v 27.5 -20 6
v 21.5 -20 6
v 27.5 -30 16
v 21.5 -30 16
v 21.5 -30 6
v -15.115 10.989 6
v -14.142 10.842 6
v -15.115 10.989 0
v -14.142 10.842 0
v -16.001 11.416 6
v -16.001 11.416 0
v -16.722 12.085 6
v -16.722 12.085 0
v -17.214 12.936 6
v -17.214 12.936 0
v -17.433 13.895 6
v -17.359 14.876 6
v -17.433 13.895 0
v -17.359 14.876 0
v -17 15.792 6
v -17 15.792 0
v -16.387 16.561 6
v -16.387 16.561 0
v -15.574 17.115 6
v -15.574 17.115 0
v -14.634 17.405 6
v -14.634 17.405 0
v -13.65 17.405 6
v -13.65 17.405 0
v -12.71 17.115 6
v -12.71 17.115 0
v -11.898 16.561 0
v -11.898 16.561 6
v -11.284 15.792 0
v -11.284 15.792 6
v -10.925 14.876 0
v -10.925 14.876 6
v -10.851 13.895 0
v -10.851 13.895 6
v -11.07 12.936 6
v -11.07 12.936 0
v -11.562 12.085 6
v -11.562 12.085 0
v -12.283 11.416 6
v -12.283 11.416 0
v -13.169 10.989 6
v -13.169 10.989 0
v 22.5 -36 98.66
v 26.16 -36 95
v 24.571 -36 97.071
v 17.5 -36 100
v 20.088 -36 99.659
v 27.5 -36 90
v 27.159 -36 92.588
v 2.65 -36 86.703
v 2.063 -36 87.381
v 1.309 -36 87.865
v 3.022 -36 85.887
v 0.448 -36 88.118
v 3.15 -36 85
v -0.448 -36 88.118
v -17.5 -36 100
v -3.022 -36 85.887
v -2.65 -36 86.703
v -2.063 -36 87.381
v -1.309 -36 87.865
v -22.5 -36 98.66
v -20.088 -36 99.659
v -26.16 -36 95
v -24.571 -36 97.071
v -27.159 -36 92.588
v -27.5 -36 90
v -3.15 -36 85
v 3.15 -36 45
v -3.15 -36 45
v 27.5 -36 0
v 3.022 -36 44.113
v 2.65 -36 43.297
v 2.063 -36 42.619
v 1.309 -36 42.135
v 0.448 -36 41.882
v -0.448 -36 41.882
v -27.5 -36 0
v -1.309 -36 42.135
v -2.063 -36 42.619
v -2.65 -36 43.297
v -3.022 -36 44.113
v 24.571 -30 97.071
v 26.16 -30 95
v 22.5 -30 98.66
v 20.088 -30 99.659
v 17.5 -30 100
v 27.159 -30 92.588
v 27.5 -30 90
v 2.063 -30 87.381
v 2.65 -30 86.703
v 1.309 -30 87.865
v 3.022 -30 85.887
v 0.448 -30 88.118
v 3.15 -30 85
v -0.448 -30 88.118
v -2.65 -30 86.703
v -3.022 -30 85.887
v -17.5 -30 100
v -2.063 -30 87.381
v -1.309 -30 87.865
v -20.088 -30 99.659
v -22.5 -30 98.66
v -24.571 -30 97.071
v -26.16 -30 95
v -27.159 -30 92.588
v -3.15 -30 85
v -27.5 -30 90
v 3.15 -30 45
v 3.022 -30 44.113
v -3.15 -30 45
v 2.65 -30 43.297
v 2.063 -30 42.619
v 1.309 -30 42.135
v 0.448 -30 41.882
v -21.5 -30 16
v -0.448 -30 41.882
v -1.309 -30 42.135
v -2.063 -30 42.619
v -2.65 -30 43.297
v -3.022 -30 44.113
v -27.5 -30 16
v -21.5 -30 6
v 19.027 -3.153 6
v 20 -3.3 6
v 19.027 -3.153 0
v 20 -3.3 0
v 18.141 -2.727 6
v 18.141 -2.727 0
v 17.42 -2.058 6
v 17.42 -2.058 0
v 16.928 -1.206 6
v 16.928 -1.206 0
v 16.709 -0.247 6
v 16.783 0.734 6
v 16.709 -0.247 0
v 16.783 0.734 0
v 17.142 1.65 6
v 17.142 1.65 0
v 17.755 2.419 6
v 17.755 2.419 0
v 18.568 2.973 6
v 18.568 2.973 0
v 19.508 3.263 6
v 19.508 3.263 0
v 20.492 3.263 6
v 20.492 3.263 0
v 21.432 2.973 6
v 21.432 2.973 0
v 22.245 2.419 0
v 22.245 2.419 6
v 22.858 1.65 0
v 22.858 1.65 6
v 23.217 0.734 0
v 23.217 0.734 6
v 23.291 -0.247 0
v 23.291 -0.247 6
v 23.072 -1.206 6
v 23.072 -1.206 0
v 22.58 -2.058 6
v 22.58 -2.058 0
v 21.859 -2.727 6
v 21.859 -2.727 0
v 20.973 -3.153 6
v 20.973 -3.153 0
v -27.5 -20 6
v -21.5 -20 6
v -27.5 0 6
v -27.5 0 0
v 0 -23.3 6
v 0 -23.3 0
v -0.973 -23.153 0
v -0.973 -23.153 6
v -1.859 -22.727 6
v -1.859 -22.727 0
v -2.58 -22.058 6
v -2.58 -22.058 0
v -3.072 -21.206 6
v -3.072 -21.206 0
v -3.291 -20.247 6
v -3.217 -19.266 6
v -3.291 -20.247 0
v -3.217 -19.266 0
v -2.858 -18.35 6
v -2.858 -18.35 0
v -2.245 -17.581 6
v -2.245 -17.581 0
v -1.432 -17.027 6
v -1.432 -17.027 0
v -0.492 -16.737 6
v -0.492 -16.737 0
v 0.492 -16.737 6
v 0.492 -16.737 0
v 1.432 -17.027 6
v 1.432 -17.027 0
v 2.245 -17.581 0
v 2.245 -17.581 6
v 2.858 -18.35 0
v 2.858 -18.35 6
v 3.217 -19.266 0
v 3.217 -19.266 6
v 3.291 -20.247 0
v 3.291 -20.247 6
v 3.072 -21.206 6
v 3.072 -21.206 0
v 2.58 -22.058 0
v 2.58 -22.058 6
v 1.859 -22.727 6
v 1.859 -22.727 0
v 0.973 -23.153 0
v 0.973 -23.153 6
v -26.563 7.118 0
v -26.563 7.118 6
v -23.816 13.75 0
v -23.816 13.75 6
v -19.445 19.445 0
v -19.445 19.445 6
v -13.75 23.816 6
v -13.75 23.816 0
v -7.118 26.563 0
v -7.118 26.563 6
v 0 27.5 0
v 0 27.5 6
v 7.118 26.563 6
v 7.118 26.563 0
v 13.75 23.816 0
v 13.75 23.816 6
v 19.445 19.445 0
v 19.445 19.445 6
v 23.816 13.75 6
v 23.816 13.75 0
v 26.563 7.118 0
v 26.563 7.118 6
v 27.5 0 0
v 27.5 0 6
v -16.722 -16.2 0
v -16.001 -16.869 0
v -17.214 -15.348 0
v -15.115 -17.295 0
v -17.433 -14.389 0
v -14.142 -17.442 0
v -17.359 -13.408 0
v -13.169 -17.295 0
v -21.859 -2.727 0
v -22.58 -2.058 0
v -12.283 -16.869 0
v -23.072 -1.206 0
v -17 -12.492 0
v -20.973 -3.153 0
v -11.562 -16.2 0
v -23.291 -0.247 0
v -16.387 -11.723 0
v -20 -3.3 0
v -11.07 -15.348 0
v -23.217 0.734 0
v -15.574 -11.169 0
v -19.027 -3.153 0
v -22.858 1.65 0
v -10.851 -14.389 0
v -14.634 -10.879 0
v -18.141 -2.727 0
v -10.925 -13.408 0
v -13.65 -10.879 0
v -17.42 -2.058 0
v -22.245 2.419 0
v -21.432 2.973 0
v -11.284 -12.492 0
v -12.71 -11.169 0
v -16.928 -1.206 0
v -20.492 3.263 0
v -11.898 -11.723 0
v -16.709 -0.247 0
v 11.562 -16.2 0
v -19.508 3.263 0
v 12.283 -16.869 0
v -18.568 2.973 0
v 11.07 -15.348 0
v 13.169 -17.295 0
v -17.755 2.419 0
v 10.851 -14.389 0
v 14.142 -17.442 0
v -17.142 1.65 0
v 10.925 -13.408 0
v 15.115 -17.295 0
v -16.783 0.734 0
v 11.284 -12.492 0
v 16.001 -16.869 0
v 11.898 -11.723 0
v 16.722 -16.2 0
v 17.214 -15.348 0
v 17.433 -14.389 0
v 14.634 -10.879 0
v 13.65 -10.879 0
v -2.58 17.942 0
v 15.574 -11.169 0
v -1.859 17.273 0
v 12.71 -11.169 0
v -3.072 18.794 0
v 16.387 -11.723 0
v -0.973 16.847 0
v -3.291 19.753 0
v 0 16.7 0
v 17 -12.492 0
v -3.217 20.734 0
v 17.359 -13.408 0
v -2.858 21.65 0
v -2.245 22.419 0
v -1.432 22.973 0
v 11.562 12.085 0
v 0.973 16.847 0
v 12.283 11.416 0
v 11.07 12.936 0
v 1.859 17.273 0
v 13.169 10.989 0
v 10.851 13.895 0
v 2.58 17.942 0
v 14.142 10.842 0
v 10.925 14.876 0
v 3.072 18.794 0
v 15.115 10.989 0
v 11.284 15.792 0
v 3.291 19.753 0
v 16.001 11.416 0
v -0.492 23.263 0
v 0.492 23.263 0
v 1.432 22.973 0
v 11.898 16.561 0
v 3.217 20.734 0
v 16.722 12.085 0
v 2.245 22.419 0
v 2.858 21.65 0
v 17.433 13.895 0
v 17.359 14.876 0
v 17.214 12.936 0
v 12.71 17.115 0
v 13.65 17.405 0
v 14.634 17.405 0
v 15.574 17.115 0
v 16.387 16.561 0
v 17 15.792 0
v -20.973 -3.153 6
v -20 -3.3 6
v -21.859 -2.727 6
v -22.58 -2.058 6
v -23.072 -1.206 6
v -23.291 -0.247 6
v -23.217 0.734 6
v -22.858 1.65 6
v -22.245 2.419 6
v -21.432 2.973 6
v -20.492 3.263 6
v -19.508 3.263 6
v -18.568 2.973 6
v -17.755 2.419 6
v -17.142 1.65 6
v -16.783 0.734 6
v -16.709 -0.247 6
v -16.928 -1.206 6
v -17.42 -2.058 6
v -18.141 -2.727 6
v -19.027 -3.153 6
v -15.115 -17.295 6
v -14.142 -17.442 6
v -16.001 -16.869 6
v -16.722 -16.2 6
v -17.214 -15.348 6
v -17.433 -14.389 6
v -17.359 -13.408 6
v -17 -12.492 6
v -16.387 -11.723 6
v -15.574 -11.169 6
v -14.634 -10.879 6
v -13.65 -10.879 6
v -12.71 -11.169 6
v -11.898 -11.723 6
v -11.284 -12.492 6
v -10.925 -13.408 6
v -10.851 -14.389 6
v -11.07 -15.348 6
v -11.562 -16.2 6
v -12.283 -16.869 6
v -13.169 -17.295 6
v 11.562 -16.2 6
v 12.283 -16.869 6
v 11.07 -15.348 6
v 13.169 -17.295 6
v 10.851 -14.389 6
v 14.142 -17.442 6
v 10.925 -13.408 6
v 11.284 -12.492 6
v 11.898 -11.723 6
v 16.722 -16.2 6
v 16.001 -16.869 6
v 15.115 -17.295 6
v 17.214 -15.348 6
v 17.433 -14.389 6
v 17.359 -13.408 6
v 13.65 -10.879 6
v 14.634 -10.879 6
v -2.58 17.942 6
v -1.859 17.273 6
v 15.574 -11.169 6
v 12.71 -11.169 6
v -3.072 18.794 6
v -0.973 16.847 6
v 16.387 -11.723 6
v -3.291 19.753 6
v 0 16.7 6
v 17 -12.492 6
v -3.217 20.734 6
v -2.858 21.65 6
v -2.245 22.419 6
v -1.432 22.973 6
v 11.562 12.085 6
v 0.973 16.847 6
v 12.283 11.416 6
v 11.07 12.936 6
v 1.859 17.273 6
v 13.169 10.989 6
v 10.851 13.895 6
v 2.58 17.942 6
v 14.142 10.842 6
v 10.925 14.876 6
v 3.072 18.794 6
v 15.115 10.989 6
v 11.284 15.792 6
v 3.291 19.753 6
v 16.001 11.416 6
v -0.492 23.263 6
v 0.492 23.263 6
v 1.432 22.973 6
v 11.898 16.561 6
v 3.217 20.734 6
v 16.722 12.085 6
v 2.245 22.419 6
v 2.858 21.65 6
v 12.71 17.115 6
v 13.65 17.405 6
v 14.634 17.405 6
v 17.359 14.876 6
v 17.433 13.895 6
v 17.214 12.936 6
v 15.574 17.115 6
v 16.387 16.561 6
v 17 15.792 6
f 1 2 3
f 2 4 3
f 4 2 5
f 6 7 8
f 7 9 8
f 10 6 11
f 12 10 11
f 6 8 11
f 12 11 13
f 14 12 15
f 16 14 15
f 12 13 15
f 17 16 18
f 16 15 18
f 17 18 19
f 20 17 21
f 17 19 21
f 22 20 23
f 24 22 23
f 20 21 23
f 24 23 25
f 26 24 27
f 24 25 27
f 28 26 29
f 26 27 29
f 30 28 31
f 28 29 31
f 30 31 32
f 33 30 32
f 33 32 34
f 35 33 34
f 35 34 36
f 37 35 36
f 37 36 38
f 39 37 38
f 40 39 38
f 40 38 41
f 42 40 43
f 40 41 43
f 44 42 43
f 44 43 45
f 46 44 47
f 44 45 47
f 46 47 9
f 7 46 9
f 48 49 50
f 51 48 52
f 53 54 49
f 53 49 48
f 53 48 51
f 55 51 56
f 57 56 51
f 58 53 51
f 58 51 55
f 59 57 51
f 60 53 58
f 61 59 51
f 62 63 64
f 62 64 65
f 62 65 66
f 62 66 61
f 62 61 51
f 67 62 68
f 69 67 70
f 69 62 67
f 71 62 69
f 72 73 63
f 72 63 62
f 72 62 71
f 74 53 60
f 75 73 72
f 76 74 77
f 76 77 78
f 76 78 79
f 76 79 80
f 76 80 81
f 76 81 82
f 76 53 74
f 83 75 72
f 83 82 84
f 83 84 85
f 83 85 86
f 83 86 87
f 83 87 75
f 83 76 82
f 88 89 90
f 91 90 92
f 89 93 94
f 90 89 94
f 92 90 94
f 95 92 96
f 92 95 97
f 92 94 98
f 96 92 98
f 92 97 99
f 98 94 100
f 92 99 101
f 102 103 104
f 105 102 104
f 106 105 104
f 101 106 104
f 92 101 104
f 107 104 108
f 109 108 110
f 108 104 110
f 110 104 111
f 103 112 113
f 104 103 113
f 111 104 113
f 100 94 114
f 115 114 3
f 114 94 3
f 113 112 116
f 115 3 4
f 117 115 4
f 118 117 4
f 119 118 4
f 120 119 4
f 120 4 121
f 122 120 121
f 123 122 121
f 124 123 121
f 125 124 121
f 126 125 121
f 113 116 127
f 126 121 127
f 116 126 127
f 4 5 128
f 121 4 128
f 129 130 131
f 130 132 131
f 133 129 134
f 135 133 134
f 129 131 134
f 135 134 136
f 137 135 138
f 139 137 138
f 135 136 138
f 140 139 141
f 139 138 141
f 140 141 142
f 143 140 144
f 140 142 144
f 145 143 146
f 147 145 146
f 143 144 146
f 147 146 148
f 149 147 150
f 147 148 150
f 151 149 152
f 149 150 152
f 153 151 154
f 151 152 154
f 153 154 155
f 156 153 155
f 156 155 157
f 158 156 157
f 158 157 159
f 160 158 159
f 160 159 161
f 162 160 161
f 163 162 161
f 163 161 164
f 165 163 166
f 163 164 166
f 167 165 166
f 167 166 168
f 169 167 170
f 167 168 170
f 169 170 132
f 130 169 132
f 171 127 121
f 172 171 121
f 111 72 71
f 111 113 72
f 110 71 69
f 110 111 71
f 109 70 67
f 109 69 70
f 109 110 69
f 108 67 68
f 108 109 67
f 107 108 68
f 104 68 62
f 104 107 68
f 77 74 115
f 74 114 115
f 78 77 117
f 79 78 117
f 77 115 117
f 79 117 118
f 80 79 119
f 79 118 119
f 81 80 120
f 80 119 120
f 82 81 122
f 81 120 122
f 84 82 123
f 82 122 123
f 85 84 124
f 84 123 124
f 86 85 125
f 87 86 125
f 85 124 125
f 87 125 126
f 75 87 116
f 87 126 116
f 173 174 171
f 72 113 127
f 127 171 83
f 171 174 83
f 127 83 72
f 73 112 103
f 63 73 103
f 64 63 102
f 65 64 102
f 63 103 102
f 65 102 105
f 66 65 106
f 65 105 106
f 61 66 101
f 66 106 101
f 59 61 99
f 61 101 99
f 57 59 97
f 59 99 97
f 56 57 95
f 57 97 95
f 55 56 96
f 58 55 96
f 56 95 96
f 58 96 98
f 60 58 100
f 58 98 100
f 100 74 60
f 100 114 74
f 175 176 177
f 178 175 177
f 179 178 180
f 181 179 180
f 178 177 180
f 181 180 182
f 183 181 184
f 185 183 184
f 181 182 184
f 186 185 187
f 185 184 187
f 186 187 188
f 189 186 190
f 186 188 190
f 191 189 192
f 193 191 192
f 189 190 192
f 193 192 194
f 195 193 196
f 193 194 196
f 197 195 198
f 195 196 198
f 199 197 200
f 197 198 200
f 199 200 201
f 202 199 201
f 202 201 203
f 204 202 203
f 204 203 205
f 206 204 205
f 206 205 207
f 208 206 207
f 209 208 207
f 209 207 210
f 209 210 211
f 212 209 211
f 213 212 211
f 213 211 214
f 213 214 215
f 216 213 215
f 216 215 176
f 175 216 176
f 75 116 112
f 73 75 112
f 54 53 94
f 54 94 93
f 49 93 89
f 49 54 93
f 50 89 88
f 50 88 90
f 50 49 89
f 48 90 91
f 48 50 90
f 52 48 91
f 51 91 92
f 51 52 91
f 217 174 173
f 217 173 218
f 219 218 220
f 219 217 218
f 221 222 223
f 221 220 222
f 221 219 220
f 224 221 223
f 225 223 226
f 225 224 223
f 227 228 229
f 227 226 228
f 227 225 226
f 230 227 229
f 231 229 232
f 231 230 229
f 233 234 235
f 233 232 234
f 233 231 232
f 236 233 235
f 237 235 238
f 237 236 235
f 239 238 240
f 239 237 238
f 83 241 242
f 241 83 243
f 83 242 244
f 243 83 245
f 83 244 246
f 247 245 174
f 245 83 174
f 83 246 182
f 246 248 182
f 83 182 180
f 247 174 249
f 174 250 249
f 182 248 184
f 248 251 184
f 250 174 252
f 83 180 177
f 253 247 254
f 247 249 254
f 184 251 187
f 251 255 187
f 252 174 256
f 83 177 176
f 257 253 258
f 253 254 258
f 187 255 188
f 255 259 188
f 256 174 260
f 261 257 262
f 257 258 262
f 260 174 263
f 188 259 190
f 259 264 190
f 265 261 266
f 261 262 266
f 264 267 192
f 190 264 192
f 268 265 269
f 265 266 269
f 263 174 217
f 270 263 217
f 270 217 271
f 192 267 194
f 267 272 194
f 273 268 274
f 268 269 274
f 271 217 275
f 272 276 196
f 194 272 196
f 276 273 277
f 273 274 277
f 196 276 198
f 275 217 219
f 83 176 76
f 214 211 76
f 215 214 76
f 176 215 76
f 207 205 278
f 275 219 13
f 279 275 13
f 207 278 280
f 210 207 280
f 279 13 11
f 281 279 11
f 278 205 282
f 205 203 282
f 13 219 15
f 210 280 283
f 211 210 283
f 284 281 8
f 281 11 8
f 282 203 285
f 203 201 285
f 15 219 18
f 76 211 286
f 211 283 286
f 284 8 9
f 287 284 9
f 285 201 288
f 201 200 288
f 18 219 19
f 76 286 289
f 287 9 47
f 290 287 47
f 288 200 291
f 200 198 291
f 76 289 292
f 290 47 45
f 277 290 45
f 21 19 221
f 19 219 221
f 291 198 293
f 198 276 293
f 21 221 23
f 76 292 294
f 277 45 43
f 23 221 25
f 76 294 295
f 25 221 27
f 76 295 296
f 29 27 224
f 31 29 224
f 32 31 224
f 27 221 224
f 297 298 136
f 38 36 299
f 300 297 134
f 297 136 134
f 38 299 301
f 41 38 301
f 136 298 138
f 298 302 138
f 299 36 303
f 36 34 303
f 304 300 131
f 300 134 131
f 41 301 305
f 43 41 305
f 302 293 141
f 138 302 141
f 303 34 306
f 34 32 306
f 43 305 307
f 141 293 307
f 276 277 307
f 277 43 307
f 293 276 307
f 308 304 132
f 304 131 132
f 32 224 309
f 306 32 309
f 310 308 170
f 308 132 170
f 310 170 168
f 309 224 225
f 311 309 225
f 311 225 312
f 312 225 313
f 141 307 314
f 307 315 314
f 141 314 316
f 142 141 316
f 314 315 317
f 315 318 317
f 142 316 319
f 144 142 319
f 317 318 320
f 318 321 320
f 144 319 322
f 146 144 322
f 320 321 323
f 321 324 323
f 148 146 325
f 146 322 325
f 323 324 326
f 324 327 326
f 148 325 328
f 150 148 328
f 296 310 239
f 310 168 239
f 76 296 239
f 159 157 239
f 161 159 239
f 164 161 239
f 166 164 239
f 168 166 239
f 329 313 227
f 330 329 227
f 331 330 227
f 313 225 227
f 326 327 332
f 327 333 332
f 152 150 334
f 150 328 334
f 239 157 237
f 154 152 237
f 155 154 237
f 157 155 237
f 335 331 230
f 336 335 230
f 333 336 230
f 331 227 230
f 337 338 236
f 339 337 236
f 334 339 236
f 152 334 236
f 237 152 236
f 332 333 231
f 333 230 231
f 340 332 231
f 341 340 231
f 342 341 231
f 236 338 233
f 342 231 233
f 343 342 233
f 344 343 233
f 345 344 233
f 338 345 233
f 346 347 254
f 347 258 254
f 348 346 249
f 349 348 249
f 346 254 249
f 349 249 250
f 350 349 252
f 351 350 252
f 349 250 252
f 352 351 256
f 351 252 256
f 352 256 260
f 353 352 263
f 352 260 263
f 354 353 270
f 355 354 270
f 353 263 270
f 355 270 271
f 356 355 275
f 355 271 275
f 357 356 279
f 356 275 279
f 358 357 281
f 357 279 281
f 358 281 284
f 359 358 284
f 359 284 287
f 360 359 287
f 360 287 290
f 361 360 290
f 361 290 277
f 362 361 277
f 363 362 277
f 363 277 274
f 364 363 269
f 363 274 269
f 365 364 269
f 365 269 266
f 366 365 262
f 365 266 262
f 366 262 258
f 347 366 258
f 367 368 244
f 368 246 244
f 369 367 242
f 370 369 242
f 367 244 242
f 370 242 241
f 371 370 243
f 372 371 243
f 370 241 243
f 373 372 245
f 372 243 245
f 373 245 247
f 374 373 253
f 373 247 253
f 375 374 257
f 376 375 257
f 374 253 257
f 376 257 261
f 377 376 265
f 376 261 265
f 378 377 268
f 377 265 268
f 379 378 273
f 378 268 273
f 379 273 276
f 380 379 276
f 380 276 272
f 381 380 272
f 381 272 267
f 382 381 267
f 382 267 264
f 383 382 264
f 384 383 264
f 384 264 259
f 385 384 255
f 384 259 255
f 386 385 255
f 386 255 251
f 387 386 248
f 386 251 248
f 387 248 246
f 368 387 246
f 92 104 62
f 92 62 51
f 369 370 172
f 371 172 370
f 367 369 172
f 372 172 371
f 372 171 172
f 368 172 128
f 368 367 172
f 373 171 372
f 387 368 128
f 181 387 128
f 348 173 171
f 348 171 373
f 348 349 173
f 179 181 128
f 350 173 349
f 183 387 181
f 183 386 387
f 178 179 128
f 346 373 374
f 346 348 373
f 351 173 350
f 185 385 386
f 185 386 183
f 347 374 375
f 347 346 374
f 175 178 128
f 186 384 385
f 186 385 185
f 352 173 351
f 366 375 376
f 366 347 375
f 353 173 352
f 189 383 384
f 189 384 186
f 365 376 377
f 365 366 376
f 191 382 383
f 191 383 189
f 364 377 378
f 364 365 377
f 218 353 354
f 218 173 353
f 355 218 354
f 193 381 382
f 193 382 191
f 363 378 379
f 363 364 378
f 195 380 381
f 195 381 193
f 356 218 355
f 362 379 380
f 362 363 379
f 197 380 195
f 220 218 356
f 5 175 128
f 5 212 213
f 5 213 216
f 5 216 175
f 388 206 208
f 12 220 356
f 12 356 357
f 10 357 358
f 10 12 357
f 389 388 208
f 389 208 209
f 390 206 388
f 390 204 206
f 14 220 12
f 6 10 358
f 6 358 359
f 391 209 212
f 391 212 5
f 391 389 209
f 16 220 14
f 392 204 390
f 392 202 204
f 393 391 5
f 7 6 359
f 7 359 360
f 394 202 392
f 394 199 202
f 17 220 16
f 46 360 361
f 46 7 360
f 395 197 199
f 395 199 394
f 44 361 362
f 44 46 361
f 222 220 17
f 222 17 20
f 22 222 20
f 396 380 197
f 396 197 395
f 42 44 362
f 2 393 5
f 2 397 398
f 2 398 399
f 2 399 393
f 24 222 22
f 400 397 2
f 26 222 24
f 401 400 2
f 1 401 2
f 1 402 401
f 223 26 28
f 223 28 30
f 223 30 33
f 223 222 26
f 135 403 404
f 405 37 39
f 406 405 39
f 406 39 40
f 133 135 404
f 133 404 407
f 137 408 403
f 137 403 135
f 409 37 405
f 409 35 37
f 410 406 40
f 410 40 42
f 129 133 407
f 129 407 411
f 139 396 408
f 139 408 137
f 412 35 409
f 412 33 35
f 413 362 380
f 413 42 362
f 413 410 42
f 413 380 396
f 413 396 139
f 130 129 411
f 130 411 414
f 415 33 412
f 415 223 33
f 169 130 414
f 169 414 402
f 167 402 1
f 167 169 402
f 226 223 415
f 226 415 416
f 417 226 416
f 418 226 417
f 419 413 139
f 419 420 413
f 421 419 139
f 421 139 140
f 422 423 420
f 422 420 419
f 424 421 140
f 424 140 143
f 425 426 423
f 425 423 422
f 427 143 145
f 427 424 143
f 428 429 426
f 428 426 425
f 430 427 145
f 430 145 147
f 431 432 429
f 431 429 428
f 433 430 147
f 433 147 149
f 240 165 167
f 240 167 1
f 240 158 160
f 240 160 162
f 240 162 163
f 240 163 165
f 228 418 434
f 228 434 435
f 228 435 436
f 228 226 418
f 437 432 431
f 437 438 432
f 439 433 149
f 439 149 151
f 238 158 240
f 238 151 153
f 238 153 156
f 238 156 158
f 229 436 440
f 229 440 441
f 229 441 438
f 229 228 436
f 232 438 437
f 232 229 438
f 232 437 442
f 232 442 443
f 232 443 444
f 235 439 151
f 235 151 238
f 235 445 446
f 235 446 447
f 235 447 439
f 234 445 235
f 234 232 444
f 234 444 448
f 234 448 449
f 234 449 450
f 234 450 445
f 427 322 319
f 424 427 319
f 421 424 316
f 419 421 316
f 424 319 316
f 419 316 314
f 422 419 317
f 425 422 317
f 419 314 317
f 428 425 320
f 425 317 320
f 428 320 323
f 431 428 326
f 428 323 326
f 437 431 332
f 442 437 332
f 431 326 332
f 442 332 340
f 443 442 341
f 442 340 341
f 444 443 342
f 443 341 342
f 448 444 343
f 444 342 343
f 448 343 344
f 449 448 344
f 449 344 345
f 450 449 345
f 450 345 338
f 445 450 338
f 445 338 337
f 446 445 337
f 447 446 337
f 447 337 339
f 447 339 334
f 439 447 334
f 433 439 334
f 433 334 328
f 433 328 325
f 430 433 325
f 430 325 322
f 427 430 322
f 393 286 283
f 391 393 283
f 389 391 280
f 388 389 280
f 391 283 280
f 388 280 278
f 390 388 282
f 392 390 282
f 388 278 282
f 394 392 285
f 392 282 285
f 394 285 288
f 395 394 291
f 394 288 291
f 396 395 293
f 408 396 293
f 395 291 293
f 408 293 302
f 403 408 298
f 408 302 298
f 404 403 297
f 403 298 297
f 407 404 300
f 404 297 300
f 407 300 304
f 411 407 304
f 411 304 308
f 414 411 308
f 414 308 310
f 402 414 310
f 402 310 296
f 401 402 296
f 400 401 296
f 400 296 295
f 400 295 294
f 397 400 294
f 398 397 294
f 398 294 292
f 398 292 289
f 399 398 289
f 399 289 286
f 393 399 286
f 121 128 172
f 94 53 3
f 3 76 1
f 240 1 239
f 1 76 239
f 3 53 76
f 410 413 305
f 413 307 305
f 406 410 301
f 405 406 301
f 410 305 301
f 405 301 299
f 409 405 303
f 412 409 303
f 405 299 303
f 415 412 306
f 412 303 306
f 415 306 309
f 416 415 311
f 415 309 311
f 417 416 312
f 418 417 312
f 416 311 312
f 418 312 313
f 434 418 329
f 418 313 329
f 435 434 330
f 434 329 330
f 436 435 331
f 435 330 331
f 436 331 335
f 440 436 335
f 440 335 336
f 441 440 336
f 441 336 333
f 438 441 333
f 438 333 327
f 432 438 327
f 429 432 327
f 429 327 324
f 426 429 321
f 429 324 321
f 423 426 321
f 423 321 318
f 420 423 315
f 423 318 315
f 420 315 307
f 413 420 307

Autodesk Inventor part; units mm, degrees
ref_plane "YZ Plane" through (0, 0, 0) normal (1, 0, 0) x (0, 1, 0)
ref_plane "XZ Plane" through (0, 0, 0) normal (0, 1, 0) x (-1, 0, 0)
ref_plane "XY Plane" through (0, 0, 0) normal (0, 0, 1) x (1, 0, 0)
sketch "Sketch1" plane through (0, 0, 0) normal (0, 0, 1) x (1, 0, 0)
  circle A0 centre (0, 0) radius 27.5
  line L0 (-27.5, 0) -> (27.5, 0)
  line L1 (27.5, 0) -> (27.5, -36)
  line L2 (27.5, -36) -> (-27.5, -36)
  line L3 (-27.5, -36) -> (-27.5, 0)
  line L4 (27.5, -30) -> (-27.5, -30)
  point P0 (20, 0)
  point P1 (20, 0)
  point P2 (20, 0)
  dimension "d0" = 55
  dimension "d1" = 36
  dimension "d2" = 6
  dimension "d7" = 20
extrude "Extrusion1" add sketch "Sketch1" along normal blind 6 contours L0 A0 | L1 L4 L3 A0 | A0 L0
extrude "Extrusion2" add sketch "Sketch1" along normal blind 100 contours L1 L2 L3 L4
sketch "Sketch2" plane through (0, 0, 6) normal (0, 0, 1) x (1, 0, 0)
  arc A0 (27.5, 0) -> (-27.5, 0) centre (0, 0) ccw projected
  line L0 (-27.5, -30) -> (-21.5, -30)
  line L1 (-21.5, -30) -> (-21.5, -20)
  line L2 (-21.5, -20) -> (-27.5, -20)
  line L3 (-27.5, -20) -> (-27.5, -30)
  point P0 (20, 0)
  point P1 (14.1421, 14.1421)
  point P2 (0, 20)
  point P3 (-14.1421, 14.1421)
  point P4 (-20, 0)
  point P5 (-14.1421, -14.1421)
  point P6 (0, -20)
  point P7 (14.1421, -14.1421)
  dimension "d8" = 20
  dimension "d11" = 360
  dimension "d20" = 6
  dimension "d21" = 10
hole "Hole1" at (20, 0, 6) at (0, 20, 6) at (-14.1421, 14.1421, 6) at (-20, 0, 6) at (-14.1421, -14.1421, 6) at (0, -20, 6) at (14.1421, -14.1421, 6) at (14.1421, 14.1421, 6) direction (0, 0, -1) diameter 6.6 end through all clearance for "Flat Head Machine Screw" size "M6" standard "Ansi Metric M Profile"
extrude "Extrusion3" add sketch "Sketch2" along normal blind 10
mirror "Mirror3" about plane through (0, 0, 0) normal (1, 0, 0) of "Extrusion3"
chamfer "Chamfer1" distance 10 angle 45 2 edges at (-24.5, -20, 16) (24.5, -20, 16)
sketch "Sketch3" plane through (-27.5, -30, 100) normal (0, 1, 0) x (1, 0, 0)
  line L0 (55, 0) -> (0, 0) projected
  line L1 (55, 84) -> (55, 0) projected
  arc A0 (30.65, 55) -> (24.35, 55) centre (27.5, 55) ccw
  arc A1 (24.35, 15) -> (30.65, 15) centre (27.5, 15) ccw
  line L2 (30.65, 55) -> (30.65, 15)
  line L3 (24.35, 55) -> (24.35, 15)
  point P0 (27.5, 100)
  dimension "d27" = 15
  dimension "d28" = 40
  dimension "d29" = 3.15
  dimension "d30" = 3.15
extrude "Extrusion4" cut sketch "Sketch3" against normal through all
fillet "Fillet1" radius 10 2 edges at (27.5, -33, 100) (-27.5, -33, 100)
properties part number "c920_plate"
